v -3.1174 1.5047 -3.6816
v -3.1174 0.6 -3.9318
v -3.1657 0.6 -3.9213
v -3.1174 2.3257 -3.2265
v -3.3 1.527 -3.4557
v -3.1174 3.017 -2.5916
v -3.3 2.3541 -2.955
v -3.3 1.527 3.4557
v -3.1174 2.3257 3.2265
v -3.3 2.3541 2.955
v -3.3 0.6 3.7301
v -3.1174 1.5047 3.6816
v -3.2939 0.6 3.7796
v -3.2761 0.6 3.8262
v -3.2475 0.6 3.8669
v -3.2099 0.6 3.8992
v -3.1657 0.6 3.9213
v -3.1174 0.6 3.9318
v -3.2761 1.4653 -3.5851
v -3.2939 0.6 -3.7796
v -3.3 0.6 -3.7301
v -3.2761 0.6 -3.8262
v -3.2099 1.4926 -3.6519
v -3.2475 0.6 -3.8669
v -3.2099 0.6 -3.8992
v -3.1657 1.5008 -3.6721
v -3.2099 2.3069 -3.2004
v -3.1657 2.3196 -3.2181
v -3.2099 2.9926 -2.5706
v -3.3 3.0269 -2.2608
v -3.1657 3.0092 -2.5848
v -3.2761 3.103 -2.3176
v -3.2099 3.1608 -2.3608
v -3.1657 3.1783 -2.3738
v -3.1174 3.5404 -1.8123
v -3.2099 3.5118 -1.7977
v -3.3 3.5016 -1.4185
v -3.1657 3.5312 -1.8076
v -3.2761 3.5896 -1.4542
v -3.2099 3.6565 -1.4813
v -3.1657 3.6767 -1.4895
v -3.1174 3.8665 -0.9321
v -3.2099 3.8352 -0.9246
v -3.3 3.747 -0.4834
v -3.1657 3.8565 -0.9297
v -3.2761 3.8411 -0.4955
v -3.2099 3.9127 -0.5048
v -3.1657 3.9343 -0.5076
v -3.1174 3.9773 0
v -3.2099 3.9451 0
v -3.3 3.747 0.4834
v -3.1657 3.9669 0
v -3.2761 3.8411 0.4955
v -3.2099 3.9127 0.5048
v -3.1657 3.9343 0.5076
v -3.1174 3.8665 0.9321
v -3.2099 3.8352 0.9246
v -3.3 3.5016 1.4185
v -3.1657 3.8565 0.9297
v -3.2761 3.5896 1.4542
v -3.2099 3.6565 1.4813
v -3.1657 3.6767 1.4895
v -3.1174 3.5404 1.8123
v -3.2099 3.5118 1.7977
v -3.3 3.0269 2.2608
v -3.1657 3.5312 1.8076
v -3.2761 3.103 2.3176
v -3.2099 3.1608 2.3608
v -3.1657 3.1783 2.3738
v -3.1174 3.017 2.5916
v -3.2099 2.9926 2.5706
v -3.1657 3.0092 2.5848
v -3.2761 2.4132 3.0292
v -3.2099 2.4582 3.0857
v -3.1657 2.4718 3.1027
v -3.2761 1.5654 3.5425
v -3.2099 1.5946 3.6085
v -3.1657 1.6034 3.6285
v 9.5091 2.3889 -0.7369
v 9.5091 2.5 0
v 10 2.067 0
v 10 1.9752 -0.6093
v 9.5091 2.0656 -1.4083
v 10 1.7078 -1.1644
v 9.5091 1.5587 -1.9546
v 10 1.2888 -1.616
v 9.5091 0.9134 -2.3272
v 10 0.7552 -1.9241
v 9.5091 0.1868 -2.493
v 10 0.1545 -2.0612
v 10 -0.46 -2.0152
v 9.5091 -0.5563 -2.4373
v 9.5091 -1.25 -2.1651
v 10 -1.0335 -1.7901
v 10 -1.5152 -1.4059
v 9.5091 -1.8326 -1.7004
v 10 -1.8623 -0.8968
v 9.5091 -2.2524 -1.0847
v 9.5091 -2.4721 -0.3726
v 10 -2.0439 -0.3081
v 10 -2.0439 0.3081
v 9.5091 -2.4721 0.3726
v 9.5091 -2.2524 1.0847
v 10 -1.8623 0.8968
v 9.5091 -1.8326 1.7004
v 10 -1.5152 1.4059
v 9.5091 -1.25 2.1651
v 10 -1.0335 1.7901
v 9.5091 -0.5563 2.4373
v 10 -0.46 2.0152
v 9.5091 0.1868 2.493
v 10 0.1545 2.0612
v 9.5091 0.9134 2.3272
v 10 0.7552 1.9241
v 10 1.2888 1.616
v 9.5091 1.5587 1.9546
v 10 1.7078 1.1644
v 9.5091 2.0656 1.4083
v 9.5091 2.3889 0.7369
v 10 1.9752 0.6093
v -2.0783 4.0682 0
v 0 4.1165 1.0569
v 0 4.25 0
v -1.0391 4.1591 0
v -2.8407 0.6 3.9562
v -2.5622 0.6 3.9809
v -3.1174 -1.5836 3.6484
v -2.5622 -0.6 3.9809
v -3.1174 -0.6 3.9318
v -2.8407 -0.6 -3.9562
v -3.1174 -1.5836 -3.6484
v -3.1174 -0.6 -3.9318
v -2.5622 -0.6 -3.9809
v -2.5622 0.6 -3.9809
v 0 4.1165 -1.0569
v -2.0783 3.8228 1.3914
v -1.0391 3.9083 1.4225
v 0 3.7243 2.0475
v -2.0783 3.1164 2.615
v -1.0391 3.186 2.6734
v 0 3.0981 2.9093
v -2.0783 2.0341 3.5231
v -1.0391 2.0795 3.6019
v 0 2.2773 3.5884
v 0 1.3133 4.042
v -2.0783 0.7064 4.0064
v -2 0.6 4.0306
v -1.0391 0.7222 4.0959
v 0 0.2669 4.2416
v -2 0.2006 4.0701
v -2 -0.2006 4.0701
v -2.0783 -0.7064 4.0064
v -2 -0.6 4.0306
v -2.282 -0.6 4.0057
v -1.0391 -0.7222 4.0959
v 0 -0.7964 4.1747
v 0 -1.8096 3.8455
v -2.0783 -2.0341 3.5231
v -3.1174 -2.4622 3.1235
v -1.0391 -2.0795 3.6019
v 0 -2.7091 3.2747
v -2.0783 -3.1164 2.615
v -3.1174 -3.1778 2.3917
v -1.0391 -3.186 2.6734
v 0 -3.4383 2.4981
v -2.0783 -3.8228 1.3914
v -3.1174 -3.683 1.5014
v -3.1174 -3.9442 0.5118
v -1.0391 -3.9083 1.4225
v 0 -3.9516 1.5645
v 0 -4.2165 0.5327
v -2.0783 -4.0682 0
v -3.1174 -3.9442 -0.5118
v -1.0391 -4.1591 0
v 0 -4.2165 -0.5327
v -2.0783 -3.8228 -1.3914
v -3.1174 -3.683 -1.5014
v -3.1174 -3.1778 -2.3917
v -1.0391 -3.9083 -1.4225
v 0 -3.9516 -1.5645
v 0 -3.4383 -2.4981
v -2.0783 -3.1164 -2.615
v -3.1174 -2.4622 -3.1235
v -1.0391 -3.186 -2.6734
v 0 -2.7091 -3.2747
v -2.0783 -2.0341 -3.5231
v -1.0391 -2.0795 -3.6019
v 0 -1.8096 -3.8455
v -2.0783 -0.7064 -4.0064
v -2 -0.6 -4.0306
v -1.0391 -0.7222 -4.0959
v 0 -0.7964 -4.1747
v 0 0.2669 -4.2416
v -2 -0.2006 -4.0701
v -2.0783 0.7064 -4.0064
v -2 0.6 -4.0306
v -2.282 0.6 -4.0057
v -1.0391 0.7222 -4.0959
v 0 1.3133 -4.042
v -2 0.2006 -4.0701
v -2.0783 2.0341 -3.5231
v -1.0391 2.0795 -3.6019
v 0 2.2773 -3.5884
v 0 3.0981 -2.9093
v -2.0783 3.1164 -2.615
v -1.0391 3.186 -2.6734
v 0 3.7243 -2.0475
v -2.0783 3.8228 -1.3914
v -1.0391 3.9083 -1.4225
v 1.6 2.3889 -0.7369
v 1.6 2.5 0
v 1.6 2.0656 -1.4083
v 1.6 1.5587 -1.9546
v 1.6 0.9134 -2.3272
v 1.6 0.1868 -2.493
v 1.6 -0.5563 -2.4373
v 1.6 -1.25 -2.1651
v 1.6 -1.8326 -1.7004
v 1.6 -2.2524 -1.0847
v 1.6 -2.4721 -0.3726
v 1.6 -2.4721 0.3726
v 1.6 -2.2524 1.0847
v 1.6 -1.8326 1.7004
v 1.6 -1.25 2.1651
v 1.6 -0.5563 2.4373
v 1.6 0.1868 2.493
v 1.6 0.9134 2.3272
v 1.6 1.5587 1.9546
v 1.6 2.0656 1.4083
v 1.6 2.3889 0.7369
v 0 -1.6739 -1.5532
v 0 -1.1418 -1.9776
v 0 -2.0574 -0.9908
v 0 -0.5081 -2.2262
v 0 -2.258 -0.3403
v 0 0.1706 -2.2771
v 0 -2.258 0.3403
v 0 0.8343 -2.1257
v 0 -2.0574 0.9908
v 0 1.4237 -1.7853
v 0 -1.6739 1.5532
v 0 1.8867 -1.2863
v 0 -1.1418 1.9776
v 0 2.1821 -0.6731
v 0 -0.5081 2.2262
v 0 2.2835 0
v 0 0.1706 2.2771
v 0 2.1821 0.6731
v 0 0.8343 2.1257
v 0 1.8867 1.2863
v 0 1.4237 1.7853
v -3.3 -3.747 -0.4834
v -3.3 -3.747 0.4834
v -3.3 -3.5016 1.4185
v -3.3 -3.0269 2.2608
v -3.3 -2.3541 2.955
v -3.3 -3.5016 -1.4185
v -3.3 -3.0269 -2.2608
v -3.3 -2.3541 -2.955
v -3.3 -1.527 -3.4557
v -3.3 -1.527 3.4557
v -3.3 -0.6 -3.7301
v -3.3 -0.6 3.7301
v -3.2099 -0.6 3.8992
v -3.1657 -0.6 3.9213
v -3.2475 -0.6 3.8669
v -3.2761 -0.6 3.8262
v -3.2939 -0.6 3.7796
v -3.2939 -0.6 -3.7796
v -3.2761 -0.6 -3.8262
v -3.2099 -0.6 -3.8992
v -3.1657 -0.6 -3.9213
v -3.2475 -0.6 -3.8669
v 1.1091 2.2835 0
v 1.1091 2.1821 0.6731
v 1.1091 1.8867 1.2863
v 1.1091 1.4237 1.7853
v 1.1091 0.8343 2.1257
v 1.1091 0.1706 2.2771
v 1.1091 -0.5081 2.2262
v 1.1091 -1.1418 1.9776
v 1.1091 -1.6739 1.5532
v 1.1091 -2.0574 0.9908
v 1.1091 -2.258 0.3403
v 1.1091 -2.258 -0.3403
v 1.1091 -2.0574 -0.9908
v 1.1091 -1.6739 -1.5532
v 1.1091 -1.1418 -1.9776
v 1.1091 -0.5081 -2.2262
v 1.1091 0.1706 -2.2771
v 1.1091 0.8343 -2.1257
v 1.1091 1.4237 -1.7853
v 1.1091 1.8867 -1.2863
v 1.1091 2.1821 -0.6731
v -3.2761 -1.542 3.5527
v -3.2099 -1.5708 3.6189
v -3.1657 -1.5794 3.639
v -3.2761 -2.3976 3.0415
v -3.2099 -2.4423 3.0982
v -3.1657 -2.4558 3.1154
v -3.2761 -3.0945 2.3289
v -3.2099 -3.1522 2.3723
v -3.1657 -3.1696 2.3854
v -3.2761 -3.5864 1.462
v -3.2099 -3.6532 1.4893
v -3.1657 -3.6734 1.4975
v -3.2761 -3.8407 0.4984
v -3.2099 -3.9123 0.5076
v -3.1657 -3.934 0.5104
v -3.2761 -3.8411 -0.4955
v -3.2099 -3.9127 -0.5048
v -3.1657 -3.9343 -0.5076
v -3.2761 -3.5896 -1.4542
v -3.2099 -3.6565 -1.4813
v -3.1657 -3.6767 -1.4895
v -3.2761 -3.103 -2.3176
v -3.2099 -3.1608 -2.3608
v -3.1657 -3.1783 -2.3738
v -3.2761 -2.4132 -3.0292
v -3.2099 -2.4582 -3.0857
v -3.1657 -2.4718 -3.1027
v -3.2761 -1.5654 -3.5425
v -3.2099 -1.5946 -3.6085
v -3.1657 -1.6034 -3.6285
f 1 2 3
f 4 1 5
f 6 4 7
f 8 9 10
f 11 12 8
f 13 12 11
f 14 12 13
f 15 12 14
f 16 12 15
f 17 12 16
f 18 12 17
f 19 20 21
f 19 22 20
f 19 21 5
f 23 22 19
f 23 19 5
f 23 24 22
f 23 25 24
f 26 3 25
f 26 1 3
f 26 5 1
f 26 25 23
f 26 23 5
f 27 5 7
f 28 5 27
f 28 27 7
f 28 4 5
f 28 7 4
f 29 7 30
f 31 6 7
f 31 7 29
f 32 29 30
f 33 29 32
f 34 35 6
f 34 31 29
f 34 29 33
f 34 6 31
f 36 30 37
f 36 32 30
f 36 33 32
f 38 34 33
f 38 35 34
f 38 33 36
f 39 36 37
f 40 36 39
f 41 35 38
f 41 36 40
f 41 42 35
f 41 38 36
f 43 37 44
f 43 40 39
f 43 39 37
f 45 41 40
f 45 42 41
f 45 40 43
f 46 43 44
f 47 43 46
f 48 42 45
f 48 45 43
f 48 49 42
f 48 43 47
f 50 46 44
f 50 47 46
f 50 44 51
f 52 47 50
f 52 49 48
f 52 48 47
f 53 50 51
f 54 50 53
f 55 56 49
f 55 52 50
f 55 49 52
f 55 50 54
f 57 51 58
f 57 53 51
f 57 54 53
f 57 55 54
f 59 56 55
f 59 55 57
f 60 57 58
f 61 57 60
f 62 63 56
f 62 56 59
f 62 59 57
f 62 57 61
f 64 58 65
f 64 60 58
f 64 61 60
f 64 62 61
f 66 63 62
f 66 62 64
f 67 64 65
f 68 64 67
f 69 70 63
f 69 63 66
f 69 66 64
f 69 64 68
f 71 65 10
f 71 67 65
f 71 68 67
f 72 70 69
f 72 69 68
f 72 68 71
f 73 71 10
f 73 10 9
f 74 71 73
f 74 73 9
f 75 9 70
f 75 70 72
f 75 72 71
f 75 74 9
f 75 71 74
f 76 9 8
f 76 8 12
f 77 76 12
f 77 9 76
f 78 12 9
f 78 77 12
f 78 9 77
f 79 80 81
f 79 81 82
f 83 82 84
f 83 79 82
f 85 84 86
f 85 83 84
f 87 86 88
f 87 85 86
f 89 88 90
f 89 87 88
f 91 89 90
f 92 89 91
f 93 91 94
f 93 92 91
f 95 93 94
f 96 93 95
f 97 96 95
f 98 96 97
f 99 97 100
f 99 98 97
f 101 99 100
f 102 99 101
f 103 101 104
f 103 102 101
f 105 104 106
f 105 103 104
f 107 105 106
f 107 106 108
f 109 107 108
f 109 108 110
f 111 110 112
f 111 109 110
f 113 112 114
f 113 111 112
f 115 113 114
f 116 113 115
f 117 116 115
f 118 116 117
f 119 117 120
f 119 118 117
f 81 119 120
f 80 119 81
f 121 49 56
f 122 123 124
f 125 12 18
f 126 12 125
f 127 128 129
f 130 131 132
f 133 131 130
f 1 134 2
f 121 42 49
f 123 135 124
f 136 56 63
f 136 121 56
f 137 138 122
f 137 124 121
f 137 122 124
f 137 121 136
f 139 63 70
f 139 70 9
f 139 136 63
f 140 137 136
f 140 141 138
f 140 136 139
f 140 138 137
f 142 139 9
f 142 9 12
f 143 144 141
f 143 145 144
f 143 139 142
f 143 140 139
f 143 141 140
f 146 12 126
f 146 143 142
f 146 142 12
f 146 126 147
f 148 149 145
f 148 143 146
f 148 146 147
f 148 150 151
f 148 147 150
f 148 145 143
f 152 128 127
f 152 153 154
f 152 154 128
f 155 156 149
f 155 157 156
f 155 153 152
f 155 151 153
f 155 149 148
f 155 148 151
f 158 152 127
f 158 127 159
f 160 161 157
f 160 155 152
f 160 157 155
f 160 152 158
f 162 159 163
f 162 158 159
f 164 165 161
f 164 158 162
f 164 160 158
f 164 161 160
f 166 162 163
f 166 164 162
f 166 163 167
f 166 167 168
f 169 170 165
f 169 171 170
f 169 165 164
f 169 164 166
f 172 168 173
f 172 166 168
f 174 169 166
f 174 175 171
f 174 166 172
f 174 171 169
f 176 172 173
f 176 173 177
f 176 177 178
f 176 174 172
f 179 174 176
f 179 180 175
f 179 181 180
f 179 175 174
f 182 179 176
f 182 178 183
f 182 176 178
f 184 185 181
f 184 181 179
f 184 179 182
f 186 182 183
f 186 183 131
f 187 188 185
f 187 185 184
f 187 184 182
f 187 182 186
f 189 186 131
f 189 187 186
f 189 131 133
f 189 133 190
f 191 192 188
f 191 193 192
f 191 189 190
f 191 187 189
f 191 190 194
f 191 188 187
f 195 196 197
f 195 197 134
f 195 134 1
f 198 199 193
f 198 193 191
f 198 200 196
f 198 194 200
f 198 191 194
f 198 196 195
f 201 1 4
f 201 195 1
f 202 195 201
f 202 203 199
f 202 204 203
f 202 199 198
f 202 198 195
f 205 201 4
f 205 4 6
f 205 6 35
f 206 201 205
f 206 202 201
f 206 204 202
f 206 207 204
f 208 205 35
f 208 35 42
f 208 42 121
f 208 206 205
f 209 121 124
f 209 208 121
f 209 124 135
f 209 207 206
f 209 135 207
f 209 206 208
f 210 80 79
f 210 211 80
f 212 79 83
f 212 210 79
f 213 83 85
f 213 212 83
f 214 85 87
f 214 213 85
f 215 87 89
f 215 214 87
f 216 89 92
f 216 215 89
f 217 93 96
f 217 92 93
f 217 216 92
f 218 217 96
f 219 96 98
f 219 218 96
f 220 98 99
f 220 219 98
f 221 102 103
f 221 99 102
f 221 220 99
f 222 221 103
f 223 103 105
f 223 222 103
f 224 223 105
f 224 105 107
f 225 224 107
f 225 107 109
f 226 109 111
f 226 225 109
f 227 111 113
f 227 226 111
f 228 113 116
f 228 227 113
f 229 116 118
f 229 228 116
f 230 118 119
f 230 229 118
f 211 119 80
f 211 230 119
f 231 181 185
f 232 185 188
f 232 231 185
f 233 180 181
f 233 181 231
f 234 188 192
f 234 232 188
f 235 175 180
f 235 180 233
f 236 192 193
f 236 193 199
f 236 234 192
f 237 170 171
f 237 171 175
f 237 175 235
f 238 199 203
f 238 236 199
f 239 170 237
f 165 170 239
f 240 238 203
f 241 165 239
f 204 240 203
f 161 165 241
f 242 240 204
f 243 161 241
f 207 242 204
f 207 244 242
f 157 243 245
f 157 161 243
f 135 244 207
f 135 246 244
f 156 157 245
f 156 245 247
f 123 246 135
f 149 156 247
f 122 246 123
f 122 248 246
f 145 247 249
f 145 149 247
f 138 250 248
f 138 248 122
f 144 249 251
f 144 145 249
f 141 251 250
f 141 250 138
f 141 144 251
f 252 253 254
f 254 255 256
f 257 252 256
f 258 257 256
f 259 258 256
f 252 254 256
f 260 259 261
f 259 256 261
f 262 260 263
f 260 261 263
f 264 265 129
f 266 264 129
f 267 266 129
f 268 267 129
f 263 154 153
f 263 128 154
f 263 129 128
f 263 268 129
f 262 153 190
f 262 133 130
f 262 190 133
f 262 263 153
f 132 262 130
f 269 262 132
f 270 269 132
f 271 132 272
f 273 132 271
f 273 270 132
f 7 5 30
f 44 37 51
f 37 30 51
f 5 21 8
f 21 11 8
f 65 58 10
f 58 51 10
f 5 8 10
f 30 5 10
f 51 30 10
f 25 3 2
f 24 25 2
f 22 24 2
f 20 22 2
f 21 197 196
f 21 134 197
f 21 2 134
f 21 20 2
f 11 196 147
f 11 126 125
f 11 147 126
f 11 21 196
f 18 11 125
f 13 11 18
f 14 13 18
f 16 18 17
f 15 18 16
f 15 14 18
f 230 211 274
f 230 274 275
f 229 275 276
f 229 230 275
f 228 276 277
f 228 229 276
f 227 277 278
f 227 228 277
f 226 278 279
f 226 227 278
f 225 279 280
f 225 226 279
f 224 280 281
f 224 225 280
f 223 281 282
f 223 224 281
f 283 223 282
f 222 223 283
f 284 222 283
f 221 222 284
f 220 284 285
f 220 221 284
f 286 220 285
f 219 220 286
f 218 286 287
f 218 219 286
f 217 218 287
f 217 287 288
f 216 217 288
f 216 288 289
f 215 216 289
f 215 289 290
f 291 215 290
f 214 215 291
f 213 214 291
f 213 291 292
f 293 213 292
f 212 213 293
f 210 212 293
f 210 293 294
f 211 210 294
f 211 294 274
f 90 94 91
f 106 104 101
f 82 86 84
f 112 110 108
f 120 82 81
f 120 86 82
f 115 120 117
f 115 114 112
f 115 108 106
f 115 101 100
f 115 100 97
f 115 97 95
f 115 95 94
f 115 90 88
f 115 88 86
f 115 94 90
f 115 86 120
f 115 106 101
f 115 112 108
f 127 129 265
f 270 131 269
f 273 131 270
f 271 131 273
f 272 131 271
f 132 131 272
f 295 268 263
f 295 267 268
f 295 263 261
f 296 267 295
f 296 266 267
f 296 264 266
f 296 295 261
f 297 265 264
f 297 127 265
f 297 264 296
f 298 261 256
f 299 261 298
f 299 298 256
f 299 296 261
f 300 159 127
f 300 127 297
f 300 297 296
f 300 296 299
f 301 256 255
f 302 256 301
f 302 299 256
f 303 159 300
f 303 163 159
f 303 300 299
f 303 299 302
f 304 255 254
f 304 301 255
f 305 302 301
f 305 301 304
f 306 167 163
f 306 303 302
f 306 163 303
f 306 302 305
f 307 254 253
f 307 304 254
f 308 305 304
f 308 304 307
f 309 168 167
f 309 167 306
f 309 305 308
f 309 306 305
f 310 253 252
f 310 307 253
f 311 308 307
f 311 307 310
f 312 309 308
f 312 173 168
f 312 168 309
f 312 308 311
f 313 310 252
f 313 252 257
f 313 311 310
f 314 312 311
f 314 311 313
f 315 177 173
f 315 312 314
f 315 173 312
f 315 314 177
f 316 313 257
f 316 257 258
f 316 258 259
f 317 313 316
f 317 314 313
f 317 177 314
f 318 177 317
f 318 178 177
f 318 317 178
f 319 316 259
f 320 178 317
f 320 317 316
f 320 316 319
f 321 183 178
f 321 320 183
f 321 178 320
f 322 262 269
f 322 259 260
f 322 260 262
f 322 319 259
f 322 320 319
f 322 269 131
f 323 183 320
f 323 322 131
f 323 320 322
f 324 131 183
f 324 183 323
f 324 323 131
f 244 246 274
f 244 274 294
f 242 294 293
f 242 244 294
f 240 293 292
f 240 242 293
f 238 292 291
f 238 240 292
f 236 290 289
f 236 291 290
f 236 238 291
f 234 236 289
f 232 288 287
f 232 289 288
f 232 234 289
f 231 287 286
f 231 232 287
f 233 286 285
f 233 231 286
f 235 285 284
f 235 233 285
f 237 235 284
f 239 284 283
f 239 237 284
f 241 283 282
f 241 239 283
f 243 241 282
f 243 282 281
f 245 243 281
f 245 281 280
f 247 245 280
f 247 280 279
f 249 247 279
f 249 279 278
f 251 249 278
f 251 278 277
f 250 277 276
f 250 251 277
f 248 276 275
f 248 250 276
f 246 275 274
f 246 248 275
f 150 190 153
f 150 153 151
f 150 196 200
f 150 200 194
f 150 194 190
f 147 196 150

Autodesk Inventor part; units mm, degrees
ref_plane "YZ Plane" through (0, 0, 0) normal (1, 0, 0) x (0, 1, 0)
ref_plane "XZ Plane" through (0, 0, 0) normal (0, 1, 0) x (-1, 0, 0)
sketch "Sketch1" plane through (0, 0, 0) normal (0, 0, 1) x (1, 0, 0)
  line L0 (-3.3, 0) -> (10, 0)
  line L1 (10, 0) -> (10, 2.5)
  line L2 (10, 2.5) -> (1.6, 2.5)
  line L3 (1.6, 2.5) -> (1.1091, 2.2835)
  line L4 (1.1091, 2.2835) -> (0, 2.2835)
  line L5 (0, 2.2835) -> (0, 4.25)
  line L6 (-5.96, 0) -> (12.66, 0) projected
  line L7 (0, -0.85) -> (0, 5.1) projected
  line L8 (-3.3, 0) -> (-3.3, 3.9613)
  line L9 (0, 4.25) -> (-3.3, 3.9613)
  line L10 (1.6, 2.5) -> (0, 2.5) construction
  dimension "d0" = 10
  dimension "d1" = 8.4
  dimension "d2" = 0.4909
  dimension "d3" = 3.3
  dimension "d4" = 5
  dimension "d5" = 4.567
  dimension "d9" = 8.5
  dimension "d10" = 5
revolve "Body" add sketch "Sketch1" angle 360 about axis through (-3.3, 0, 0) along (1, 0, 0)
sketch "Sketch2" plane through (-3.3, 0, 0) normal (-1, 0, 0) x (0, 0, 1)
  circle A0 centre (0, 0) radius 4.25 projected
  line L0 (0, 0) -> (0, 3.9613) projected
  line L1 (-4.25, 0.6) -> (4.25, 0.6)
  line L2 (4.25, 0.6) -> (4.25, -0.6)
  line L3 (4.25, -0.6) -> (-4.25, -0.6)
  line L4 (-4.25, -0.6) -> (-4.25, 0.6)
  line L5 (-4.25, 0) -> (4.25, 0) construction
  line L6 (0, 0.6) -> (0, -0.6) construction
  point P0 (0, 0)
  dimension "d11" = 1.2
  dimension "d12" = 8.5
fillet "Fillet1" radius 0.2 1 edges at (-3.3, -3.9613, 0)
extrude "Slot" cut sketch "Sketch2" against normal blind 1.3 contours A0 L3 L1 | L2 L3 A0 | A0 L1 L2 | A0 L4 L1 | L3 L4 A0
thread "Thread" size "M5x0.8" class "6g" standard "ISO Metric profile" length 8.4
chamfer "Chamfer1" distance 0.433 distance2 0.4909 1 edges at (10, -2.5, 0) measured on face at (10, 0.6684, -0.7339)
ref_plane "Work Plane1" through (30.1625, 0, 0) normal (0, 0, -1) x (1, 0, 0)
equation "\"d11\" = SBR"
equation "\"d12\" = KOD"
equation "\"d14\" = RR"
equation "\"d19\" = STI"
equation "\"d15\" = GEL"
equation "\"d17\" = -0.5 * SPD + 0.5 * GD"
equation "\"d0\" = NLG"
equation "\"d1\" = GEL"
equation "\"d3\" = KOH"
equation "\"d4\" = GD"
equation "\"d5\" = BDM"
equation "\"d9\" = KOD"
equation "\"d10\" = KEWI"
equation "\"GD\" = 5"
equation "\"NLG\" = 10"
equation "\"GEL\" = 8.4"
equation "\"KOD\" = 8.5"
equation "\"KOH\" = 3.3"
equation "\"GAL\" = 0.61345 * PTC"
equation "\"SPD\" = 4.13397"
equation "\"BDM\" = 4.56699"
equation "\"GUL\" = 0.61345 * PTC"
equation "\"RR\" = 0.2"
equation "\"SBR\" = 1.2"
equation "\"STI\" = 1.3"
equation "\"KEWI\" = 5deg"
equation "\"PTC\" = 0.8"
equation "\"THREADDIA\" = 5"
equation "\"TOA\" = 30deg"
equation "\"NND\" = 5"
equation "\"GD1\" = THREADDIA - 1.2269 * PTC"
properties part number "DIN 84 - M5 x 10" material "Steel, Mild"
